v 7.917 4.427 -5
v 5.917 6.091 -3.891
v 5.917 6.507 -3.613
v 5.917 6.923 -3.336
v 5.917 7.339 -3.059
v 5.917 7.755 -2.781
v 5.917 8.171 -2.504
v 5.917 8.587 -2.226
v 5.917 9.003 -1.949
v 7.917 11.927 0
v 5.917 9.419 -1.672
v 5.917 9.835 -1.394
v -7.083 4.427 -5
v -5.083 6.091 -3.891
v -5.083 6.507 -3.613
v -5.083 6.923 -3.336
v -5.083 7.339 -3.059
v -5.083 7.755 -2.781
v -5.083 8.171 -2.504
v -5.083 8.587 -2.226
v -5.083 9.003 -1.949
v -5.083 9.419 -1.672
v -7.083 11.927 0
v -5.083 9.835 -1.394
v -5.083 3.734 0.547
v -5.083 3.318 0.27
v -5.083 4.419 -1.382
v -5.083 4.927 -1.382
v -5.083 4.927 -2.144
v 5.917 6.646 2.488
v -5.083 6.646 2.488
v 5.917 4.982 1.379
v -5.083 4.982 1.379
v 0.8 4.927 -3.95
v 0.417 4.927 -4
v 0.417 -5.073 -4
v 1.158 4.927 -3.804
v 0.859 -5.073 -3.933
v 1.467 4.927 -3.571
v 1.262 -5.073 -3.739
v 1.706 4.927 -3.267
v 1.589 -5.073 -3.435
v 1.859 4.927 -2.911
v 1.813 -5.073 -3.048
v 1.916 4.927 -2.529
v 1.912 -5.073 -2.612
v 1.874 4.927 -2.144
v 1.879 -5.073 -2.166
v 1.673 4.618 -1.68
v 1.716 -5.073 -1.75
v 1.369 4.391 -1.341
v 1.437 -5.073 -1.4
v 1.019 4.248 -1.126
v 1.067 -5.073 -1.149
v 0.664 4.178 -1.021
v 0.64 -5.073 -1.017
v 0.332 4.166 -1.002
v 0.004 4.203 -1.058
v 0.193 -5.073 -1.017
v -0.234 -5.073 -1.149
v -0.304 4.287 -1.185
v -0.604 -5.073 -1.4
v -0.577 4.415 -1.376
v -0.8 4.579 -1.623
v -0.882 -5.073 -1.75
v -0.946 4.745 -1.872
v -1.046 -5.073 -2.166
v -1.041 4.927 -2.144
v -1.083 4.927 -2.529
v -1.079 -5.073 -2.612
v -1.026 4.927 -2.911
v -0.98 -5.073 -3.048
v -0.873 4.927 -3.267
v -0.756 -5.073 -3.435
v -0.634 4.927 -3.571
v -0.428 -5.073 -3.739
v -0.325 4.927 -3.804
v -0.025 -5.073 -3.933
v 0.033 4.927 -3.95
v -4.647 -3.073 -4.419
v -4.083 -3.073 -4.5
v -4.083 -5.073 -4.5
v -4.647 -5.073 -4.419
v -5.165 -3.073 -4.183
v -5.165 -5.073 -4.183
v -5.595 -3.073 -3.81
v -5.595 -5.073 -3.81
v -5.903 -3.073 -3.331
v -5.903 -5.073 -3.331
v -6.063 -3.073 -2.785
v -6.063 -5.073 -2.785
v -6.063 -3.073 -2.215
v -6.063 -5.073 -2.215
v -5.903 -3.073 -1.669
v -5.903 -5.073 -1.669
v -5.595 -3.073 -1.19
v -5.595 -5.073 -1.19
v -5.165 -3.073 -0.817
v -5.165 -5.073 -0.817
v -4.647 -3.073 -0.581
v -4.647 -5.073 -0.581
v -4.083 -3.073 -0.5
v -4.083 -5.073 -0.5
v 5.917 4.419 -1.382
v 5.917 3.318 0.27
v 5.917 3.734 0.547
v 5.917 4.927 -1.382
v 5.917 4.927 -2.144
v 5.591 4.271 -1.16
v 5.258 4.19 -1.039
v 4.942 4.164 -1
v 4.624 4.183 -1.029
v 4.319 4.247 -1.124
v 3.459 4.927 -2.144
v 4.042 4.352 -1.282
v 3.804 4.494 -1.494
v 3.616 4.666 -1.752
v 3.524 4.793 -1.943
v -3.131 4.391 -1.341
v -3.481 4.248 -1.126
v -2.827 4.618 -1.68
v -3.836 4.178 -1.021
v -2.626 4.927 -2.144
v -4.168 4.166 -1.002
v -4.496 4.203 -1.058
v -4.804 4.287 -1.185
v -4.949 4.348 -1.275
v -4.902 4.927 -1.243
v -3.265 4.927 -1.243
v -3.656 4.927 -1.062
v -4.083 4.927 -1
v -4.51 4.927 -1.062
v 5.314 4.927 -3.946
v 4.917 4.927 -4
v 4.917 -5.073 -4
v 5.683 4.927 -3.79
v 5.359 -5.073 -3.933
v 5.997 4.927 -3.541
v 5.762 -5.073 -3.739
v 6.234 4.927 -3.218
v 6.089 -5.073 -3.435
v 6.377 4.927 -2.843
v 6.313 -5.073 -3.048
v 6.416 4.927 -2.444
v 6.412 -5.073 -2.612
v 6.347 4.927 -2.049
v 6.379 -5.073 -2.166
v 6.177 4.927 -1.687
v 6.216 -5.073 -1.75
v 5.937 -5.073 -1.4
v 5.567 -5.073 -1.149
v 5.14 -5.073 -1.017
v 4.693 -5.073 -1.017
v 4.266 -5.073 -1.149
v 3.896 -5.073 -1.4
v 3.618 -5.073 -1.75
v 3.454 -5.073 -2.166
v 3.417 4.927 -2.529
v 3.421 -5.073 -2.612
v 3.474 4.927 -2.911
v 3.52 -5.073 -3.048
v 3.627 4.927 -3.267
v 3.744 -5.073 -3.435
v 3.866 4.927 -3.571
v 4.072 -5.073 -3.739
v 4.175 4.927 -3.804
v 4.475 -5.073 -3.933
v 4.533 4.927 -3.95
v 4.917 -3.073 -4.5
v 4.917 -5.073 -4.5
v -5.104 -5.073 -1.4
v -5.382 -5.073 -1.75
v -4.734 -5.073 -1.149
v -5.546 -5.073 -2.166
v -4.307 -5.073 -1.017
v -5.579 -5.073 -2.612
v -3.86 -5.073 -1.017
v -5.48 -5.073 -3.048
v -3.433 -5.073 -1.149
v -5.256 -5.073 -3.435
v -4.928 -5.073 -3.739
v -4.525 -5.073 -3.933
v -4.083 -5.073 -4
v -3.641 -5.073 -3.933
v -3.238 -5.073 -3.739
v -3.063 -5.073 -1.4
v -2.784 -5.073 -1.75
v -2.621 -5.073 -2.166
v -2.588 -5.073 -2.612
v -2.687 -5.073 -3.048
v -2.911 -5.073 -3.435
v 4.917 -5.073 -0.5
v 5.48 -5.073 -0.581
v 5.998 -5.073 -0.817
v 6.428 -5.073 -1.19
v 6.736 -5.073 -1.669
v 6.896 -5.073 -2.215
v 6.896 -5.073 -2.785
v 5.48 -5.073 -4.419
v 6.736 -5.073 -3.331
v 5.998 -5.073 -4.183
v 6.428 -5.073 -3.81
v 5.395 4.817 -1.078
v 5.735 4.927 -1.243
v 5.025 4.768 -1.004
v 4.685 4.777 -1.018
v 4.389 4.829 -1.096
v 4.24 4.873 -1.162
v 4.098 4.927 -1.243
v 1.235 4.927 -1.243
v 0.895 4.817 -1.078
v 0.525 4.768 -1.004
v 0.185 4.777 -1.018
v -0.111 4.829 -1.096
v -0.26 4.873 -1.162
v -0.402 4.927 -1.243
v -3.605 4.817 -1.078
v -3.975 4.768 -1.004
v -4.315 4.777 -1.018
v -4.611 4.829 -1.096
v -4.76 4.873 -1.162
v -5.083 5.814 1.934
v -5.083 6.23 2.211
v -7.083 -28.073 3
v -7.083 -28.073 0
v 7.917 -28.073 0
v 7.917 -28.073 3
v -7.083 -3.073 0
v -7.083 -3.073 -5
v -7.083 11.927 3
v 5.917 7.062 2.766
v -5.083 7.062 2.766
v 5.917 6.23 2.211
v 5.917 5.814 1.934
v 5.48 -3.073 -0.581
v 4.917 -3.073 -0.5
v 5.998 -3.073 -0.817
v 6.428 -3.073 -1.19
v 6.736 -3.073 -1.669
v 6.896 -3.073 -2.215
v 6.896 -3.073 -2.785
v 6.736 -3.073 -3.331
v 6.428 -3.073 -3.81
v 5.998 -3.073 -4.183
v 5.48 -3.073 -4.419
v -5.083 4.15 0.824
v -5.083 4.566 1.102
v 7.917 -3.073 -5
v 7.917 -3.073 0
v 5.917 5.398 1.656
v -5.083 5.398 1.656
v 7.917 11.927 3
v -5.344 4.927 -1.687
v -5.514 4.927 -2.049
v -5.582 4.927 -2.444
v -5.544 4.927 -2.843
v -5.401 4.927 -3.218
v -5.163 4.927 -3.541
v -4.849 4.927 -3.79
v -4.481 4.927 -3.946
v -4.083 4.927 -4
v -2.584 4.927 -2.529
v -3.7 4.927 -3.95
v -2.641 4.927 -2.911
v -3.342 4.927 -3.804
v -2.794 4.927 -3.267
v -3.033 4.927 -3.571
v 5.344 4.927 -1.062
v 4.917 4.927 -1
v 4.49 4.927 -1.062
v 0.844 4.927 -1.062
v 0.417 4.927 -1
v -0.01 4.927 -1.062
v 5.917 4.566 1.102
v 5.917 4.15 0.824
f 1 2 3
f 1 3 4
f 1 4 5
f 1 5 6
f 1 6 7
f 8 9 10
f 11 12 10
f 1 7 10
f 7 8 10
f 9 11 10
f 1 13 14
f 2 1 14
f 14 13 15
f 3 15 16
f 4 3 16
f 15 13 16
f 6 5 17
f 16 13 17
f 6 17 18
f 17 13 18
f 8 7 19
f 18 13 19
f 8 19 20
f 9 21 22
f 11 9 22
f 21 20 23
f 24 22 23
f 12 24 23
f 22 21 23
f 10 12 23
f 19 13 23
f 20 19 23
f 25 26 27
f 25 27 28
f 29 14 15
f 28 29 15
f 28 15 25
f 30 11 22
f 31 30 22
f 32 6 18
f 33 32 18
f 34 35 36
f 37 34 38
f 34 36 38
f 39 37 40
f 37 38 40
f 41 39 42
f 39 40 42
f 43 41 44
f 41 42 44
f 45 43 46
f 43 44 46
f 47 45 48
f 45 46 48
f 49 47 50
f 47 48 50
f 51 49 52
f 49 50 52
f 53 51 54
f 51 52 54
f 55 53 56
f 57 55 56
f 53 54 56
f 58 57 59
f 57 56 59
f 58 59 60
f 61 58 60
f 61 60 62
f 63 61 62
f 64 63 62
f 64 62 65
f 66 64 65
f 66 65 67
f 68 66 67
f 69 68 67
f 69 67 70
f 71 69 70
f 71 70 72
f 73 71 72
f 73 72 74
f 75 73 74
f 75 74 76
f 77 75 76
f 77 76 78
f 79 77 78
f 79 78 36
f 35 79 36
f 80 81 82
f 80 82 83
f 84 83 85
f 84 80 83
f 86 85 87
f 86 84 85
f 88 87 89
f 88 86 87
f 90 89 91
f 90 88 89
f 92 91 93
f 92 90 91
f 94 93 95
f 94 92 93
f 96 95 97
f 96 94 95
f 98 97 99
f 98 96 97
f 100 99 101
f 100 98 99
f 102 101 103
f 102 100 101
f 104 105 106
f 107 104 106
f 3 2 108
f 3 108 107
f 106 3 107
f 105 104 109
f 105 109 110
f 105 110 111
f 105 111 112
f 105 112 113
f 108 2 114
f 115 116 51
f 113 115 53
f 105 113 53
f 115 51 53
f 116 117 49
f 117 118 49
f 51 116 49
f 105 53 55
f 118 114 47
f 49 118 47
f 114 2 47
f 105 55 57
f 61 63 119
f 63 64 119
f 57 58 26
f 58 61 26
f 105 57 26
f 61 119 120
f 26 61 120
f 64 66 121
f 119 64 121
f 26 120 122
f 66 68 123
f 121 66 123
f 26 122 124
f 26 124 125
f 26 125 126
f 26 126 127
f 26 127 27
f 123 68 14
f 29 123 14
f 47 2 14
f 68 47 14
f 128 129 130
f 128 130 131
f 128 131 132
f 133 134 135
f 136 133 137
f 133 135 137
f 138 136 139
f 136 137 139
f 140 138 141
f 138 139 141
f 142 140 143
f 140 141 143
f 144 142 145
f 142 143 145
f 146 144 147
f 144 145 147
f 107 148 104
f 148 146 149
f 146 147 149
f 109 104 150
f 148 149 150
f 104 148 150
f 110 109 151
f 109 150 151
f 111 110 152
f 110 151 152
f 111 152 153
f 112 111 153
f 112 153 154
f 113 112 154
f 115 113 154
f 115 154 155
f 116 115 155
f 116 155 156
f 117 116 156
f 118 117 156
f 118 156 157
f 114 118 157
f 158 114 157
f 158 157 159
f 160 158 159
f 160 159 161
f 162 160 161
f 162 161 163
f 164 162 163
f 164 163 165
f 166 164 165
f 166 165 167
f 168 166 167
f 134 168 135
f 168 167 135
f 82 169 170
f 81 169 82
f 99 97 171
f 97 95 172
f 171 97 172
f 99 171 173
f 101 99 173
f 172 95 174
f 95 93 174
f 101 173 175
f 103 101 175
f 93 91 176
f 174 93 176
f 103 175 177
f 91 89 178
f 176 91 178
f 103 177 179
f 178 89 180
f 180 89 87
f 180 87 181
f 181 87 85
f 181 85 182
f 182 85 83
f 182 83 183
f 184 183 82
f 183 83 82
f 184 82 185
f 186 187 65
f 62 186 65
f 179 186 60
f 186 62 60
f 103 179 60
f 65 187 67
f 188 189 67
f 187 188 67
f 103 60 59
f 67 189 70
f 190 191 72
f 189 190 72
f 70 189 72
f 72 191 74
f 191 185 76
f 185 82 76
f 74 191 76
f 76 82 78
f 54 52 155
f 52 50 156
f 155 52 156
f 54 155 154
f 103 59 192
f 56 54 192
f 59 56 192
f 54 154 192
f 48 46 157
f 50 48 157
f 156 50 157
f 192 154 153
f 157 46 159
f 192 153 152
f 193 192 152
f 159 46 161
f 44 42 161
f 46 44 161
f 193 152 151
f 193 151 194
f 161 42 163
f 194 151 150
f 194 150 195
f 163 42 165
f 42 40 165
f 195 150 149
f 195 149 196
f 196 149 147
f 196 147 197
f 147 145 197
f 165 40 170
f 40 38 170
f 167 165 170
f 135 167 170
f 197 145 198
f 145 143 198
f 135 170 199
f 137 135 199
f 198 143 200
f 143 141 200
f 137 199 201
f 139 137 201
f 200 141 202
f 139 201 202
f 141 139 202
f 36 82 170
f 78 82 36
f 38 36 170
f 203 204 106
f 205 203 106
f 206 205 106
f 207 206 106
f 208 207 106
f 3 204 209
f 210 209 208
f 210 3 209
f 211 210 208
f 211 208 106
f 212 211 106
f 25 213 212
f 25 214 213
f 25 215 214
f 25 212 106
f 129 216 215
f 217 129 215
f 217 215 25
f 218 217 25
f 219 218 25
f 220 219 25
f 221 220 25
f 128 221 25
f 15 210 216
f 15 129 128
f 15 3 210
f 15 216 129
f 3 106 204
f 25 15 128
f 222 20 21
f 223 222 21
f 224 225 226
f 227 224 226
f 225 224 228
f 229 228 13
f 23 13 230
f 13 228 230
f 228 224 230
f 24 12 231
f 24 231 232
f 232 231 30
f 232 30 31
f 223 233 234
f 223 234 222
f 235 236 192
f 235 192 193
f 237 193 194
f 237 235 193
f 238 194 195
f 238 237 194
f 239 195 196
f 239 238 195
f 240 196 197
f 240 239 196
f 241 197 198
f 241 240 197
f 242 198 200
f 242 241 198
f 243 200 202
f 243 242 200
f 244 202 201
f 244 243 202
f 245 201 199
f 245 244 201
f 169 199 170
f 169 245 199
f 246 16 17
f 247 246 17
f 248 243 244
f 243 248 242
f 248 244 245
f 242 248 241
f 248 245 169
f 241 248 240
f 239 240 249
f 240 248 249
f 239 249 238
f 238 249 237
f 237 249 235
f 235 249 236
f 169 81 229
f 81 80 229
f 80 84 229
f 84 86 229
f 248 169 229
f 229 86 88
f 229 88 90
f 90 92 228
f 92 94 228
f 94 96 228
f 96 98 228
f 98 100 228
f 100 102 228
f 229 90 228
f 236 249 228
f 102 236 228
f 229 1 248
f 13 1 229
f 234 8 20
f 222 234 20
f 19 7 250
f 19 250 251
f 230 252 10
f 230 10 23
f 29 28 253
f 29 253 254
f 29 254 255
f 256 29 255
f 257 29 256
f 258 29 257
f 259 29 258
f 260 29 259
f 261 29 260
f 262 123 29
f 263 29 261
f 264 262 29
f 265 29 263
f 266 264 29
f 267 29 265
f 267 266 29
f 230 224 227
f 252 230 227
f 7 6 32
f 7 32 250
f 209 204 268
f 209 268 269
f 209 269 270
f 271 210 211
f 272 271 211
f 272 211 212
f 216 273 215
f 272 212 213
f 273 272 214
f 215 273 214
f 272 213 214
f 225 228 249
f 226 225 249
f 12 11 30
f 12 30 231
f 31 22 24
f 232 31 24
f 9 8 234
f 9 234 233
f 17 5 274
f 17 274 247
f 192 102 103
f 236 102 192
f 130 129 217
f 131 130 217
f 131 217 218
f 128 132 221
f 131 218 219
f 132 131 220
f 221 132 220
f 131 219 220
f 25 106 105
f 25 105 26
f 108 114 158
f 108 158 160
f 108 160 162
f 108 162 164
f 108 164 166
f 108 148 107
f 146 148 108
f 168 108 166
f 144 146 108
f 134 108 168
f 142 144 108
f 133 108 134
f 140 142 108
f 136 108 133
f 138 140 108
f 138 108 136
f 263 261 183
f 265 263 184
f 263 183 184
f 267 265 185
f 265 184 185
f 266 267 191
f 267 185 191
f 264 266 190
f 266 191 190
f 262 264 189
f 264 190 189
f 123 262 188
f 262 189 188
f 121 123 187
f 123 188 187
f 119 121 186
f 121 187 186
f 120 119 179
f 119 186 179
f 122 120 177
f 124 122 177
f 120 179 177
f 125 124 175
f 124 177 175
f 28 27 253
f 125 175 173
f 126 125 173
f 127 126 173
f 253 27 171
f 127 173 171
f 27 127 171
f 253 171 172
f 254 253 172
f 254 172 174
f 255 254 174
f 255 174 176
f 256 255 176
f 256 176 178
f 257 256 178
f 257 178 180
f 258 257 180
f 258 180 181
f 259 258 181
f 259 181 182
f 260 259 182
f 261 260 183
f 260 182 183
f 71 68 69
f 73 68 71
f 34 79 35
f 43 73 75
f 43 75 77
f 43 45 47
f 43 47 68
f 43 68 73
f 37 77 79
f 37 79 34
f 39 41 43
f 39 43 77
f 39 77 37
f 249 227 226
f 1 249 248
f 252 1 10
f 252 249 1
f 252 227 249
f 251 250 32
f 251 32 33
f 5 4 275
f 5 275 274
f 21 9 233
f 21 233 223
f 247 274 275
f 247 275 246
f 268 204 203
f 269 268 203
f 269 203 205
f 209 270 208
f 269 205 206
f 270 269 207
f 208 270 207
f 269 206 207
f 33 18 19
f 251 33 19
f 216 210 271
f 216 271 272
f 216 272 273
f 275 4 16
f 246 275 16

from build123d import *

# Parameters (mm, degrees)
SKETCH1_W           = 15
SKETCH1_H           = 40
BOSS_EXTRUDE2_DEPTH = 3
SKETCH2_W           = 15
SKETCH2_H           = 15
BOSS_EXTRUDE5_DEPTH = 5
CUT_EXTRUDE9_DEPTH  = 15
SKETCH14_W          = 11
SKETCH14_H          = 0.5
CUT_EXTRUDE10_DEPTH = 5
BOSS_EXTRUDE9_DEPTH = 2
SKETCH18_R          = 1.5
CUT_EXTRUDE11_DEPTH = 10


with BuildPart() as part:
    # Sketch1 → Boss-Extrude2 (new body)
    with BuildSketch(Plane.XY):
        with Locations((0.416666667, -8.072916667)):
            Rectangle(SKETCH1_W, SKETCH1_H)
    extrude(amount=BOSS_EXTRUDE2_DEPTH)

    # Sketch2 → Boss-Extrude5 (add)
    with BuildSketch(Plane(origin=(0, 0, 0), x_dir=(-1, 0, 0), z_dir=(0, 0, -1))):
        with Locations((-0.416666667, 4.427083333)):
            Rectangle(SKETCH2_W, SKETCH2_H)
    extrude(amount=BOSS_EXTRUDE5_DEPTH)

    # Sketch12 → Cut-Extrude9 (cut)
    with BuildSketch(Plane.ZY.offset(7.083333333)):
        Polygon((-5, 11.927083333), (-5, 4.427083333), (0, 11.927083333), align=None)
    extrude(amount=-CUT_EXTRUDE9_DEPTH, mode=Mode.SUBTRACT)

    # Sketch14 → Cut-Extrude10 (cut)
    with BuildSketch(Plane(origin=(0, 3.669871795, -5.504807692), x_dir=(-1, 0, 0), z_dir=(0, 0.5547001962252293, -0.8320502943378436))):
        with Locations((-0.416666667, 3.160055009)):
            Rectangle(SKETCH14_W, SKETCH14_H)
        with Locations((-0.416666667, 4.160055009)):
            Rectangle(SKETCH14_W, SKETCH14_H)
        with Locations((-0.416666667, 5.160055009)):
            Rectangle(SKETCH14_W, SKETCH14_H)
        with Locations((-0.416666667, 6.160055009)):
            Rectangle(SKETCH14_W, SKETCH14_H)
        with Locations((-0.416666667, 7.160055009)):
            Rectangle(SKETCH14_W, SKETCH14_H)
    extrude(amount=-CUT_EXTRUDE10_DEPTH, mode=Mode.SUBTRACT)

    # Sketch17 → Boss-Extrude9 (add)
    with BuildSketch(Plane(origin=(0, -3.072916667, 0), x_dir=(-1, 0, 0), z_dir=(0, -1, 0))):
        with BuildLine():
            Line((-4.916666667, 4.5), (4.083333333, 4.5))
            ThreePointArc((4.083333333, 4.5), (6.083333333, 2.5), (4.083333333, 0.5))
            Line((4.083333333, 0.5), (-4.916666667, 0.5))
            ThreePointArc((-4.916666667, 0.5), (-6.916666667, 2.5), (-4.916666667, 4.5))
        make_face()
    extrude(amount=BOSS_EXTRUDE9_DEPTH)

    # Sketch18 → Cut-Extrude11 (cut)
    with BuildSketch(Plane.XZ.offset(5.072916667)):
        with Locations(Location((-4.083333333, -2.5, 0), (0, 0, 270))):
            Circle(SKETCH18_R)
        with Locations(Location((4.916666667, -2.5, 0), (0, 0, 270))):
            Circle(SKETCH18_R)
        with Locations(Location((0.416666667, -2.5, 0), (0, 0, 270))):
            Circle(SKETCH18_R)
    extrude(amount=-CUT_EXTRUDE11_DEPTH, mode=Mode.SUBTRACT)


solid = part.part
